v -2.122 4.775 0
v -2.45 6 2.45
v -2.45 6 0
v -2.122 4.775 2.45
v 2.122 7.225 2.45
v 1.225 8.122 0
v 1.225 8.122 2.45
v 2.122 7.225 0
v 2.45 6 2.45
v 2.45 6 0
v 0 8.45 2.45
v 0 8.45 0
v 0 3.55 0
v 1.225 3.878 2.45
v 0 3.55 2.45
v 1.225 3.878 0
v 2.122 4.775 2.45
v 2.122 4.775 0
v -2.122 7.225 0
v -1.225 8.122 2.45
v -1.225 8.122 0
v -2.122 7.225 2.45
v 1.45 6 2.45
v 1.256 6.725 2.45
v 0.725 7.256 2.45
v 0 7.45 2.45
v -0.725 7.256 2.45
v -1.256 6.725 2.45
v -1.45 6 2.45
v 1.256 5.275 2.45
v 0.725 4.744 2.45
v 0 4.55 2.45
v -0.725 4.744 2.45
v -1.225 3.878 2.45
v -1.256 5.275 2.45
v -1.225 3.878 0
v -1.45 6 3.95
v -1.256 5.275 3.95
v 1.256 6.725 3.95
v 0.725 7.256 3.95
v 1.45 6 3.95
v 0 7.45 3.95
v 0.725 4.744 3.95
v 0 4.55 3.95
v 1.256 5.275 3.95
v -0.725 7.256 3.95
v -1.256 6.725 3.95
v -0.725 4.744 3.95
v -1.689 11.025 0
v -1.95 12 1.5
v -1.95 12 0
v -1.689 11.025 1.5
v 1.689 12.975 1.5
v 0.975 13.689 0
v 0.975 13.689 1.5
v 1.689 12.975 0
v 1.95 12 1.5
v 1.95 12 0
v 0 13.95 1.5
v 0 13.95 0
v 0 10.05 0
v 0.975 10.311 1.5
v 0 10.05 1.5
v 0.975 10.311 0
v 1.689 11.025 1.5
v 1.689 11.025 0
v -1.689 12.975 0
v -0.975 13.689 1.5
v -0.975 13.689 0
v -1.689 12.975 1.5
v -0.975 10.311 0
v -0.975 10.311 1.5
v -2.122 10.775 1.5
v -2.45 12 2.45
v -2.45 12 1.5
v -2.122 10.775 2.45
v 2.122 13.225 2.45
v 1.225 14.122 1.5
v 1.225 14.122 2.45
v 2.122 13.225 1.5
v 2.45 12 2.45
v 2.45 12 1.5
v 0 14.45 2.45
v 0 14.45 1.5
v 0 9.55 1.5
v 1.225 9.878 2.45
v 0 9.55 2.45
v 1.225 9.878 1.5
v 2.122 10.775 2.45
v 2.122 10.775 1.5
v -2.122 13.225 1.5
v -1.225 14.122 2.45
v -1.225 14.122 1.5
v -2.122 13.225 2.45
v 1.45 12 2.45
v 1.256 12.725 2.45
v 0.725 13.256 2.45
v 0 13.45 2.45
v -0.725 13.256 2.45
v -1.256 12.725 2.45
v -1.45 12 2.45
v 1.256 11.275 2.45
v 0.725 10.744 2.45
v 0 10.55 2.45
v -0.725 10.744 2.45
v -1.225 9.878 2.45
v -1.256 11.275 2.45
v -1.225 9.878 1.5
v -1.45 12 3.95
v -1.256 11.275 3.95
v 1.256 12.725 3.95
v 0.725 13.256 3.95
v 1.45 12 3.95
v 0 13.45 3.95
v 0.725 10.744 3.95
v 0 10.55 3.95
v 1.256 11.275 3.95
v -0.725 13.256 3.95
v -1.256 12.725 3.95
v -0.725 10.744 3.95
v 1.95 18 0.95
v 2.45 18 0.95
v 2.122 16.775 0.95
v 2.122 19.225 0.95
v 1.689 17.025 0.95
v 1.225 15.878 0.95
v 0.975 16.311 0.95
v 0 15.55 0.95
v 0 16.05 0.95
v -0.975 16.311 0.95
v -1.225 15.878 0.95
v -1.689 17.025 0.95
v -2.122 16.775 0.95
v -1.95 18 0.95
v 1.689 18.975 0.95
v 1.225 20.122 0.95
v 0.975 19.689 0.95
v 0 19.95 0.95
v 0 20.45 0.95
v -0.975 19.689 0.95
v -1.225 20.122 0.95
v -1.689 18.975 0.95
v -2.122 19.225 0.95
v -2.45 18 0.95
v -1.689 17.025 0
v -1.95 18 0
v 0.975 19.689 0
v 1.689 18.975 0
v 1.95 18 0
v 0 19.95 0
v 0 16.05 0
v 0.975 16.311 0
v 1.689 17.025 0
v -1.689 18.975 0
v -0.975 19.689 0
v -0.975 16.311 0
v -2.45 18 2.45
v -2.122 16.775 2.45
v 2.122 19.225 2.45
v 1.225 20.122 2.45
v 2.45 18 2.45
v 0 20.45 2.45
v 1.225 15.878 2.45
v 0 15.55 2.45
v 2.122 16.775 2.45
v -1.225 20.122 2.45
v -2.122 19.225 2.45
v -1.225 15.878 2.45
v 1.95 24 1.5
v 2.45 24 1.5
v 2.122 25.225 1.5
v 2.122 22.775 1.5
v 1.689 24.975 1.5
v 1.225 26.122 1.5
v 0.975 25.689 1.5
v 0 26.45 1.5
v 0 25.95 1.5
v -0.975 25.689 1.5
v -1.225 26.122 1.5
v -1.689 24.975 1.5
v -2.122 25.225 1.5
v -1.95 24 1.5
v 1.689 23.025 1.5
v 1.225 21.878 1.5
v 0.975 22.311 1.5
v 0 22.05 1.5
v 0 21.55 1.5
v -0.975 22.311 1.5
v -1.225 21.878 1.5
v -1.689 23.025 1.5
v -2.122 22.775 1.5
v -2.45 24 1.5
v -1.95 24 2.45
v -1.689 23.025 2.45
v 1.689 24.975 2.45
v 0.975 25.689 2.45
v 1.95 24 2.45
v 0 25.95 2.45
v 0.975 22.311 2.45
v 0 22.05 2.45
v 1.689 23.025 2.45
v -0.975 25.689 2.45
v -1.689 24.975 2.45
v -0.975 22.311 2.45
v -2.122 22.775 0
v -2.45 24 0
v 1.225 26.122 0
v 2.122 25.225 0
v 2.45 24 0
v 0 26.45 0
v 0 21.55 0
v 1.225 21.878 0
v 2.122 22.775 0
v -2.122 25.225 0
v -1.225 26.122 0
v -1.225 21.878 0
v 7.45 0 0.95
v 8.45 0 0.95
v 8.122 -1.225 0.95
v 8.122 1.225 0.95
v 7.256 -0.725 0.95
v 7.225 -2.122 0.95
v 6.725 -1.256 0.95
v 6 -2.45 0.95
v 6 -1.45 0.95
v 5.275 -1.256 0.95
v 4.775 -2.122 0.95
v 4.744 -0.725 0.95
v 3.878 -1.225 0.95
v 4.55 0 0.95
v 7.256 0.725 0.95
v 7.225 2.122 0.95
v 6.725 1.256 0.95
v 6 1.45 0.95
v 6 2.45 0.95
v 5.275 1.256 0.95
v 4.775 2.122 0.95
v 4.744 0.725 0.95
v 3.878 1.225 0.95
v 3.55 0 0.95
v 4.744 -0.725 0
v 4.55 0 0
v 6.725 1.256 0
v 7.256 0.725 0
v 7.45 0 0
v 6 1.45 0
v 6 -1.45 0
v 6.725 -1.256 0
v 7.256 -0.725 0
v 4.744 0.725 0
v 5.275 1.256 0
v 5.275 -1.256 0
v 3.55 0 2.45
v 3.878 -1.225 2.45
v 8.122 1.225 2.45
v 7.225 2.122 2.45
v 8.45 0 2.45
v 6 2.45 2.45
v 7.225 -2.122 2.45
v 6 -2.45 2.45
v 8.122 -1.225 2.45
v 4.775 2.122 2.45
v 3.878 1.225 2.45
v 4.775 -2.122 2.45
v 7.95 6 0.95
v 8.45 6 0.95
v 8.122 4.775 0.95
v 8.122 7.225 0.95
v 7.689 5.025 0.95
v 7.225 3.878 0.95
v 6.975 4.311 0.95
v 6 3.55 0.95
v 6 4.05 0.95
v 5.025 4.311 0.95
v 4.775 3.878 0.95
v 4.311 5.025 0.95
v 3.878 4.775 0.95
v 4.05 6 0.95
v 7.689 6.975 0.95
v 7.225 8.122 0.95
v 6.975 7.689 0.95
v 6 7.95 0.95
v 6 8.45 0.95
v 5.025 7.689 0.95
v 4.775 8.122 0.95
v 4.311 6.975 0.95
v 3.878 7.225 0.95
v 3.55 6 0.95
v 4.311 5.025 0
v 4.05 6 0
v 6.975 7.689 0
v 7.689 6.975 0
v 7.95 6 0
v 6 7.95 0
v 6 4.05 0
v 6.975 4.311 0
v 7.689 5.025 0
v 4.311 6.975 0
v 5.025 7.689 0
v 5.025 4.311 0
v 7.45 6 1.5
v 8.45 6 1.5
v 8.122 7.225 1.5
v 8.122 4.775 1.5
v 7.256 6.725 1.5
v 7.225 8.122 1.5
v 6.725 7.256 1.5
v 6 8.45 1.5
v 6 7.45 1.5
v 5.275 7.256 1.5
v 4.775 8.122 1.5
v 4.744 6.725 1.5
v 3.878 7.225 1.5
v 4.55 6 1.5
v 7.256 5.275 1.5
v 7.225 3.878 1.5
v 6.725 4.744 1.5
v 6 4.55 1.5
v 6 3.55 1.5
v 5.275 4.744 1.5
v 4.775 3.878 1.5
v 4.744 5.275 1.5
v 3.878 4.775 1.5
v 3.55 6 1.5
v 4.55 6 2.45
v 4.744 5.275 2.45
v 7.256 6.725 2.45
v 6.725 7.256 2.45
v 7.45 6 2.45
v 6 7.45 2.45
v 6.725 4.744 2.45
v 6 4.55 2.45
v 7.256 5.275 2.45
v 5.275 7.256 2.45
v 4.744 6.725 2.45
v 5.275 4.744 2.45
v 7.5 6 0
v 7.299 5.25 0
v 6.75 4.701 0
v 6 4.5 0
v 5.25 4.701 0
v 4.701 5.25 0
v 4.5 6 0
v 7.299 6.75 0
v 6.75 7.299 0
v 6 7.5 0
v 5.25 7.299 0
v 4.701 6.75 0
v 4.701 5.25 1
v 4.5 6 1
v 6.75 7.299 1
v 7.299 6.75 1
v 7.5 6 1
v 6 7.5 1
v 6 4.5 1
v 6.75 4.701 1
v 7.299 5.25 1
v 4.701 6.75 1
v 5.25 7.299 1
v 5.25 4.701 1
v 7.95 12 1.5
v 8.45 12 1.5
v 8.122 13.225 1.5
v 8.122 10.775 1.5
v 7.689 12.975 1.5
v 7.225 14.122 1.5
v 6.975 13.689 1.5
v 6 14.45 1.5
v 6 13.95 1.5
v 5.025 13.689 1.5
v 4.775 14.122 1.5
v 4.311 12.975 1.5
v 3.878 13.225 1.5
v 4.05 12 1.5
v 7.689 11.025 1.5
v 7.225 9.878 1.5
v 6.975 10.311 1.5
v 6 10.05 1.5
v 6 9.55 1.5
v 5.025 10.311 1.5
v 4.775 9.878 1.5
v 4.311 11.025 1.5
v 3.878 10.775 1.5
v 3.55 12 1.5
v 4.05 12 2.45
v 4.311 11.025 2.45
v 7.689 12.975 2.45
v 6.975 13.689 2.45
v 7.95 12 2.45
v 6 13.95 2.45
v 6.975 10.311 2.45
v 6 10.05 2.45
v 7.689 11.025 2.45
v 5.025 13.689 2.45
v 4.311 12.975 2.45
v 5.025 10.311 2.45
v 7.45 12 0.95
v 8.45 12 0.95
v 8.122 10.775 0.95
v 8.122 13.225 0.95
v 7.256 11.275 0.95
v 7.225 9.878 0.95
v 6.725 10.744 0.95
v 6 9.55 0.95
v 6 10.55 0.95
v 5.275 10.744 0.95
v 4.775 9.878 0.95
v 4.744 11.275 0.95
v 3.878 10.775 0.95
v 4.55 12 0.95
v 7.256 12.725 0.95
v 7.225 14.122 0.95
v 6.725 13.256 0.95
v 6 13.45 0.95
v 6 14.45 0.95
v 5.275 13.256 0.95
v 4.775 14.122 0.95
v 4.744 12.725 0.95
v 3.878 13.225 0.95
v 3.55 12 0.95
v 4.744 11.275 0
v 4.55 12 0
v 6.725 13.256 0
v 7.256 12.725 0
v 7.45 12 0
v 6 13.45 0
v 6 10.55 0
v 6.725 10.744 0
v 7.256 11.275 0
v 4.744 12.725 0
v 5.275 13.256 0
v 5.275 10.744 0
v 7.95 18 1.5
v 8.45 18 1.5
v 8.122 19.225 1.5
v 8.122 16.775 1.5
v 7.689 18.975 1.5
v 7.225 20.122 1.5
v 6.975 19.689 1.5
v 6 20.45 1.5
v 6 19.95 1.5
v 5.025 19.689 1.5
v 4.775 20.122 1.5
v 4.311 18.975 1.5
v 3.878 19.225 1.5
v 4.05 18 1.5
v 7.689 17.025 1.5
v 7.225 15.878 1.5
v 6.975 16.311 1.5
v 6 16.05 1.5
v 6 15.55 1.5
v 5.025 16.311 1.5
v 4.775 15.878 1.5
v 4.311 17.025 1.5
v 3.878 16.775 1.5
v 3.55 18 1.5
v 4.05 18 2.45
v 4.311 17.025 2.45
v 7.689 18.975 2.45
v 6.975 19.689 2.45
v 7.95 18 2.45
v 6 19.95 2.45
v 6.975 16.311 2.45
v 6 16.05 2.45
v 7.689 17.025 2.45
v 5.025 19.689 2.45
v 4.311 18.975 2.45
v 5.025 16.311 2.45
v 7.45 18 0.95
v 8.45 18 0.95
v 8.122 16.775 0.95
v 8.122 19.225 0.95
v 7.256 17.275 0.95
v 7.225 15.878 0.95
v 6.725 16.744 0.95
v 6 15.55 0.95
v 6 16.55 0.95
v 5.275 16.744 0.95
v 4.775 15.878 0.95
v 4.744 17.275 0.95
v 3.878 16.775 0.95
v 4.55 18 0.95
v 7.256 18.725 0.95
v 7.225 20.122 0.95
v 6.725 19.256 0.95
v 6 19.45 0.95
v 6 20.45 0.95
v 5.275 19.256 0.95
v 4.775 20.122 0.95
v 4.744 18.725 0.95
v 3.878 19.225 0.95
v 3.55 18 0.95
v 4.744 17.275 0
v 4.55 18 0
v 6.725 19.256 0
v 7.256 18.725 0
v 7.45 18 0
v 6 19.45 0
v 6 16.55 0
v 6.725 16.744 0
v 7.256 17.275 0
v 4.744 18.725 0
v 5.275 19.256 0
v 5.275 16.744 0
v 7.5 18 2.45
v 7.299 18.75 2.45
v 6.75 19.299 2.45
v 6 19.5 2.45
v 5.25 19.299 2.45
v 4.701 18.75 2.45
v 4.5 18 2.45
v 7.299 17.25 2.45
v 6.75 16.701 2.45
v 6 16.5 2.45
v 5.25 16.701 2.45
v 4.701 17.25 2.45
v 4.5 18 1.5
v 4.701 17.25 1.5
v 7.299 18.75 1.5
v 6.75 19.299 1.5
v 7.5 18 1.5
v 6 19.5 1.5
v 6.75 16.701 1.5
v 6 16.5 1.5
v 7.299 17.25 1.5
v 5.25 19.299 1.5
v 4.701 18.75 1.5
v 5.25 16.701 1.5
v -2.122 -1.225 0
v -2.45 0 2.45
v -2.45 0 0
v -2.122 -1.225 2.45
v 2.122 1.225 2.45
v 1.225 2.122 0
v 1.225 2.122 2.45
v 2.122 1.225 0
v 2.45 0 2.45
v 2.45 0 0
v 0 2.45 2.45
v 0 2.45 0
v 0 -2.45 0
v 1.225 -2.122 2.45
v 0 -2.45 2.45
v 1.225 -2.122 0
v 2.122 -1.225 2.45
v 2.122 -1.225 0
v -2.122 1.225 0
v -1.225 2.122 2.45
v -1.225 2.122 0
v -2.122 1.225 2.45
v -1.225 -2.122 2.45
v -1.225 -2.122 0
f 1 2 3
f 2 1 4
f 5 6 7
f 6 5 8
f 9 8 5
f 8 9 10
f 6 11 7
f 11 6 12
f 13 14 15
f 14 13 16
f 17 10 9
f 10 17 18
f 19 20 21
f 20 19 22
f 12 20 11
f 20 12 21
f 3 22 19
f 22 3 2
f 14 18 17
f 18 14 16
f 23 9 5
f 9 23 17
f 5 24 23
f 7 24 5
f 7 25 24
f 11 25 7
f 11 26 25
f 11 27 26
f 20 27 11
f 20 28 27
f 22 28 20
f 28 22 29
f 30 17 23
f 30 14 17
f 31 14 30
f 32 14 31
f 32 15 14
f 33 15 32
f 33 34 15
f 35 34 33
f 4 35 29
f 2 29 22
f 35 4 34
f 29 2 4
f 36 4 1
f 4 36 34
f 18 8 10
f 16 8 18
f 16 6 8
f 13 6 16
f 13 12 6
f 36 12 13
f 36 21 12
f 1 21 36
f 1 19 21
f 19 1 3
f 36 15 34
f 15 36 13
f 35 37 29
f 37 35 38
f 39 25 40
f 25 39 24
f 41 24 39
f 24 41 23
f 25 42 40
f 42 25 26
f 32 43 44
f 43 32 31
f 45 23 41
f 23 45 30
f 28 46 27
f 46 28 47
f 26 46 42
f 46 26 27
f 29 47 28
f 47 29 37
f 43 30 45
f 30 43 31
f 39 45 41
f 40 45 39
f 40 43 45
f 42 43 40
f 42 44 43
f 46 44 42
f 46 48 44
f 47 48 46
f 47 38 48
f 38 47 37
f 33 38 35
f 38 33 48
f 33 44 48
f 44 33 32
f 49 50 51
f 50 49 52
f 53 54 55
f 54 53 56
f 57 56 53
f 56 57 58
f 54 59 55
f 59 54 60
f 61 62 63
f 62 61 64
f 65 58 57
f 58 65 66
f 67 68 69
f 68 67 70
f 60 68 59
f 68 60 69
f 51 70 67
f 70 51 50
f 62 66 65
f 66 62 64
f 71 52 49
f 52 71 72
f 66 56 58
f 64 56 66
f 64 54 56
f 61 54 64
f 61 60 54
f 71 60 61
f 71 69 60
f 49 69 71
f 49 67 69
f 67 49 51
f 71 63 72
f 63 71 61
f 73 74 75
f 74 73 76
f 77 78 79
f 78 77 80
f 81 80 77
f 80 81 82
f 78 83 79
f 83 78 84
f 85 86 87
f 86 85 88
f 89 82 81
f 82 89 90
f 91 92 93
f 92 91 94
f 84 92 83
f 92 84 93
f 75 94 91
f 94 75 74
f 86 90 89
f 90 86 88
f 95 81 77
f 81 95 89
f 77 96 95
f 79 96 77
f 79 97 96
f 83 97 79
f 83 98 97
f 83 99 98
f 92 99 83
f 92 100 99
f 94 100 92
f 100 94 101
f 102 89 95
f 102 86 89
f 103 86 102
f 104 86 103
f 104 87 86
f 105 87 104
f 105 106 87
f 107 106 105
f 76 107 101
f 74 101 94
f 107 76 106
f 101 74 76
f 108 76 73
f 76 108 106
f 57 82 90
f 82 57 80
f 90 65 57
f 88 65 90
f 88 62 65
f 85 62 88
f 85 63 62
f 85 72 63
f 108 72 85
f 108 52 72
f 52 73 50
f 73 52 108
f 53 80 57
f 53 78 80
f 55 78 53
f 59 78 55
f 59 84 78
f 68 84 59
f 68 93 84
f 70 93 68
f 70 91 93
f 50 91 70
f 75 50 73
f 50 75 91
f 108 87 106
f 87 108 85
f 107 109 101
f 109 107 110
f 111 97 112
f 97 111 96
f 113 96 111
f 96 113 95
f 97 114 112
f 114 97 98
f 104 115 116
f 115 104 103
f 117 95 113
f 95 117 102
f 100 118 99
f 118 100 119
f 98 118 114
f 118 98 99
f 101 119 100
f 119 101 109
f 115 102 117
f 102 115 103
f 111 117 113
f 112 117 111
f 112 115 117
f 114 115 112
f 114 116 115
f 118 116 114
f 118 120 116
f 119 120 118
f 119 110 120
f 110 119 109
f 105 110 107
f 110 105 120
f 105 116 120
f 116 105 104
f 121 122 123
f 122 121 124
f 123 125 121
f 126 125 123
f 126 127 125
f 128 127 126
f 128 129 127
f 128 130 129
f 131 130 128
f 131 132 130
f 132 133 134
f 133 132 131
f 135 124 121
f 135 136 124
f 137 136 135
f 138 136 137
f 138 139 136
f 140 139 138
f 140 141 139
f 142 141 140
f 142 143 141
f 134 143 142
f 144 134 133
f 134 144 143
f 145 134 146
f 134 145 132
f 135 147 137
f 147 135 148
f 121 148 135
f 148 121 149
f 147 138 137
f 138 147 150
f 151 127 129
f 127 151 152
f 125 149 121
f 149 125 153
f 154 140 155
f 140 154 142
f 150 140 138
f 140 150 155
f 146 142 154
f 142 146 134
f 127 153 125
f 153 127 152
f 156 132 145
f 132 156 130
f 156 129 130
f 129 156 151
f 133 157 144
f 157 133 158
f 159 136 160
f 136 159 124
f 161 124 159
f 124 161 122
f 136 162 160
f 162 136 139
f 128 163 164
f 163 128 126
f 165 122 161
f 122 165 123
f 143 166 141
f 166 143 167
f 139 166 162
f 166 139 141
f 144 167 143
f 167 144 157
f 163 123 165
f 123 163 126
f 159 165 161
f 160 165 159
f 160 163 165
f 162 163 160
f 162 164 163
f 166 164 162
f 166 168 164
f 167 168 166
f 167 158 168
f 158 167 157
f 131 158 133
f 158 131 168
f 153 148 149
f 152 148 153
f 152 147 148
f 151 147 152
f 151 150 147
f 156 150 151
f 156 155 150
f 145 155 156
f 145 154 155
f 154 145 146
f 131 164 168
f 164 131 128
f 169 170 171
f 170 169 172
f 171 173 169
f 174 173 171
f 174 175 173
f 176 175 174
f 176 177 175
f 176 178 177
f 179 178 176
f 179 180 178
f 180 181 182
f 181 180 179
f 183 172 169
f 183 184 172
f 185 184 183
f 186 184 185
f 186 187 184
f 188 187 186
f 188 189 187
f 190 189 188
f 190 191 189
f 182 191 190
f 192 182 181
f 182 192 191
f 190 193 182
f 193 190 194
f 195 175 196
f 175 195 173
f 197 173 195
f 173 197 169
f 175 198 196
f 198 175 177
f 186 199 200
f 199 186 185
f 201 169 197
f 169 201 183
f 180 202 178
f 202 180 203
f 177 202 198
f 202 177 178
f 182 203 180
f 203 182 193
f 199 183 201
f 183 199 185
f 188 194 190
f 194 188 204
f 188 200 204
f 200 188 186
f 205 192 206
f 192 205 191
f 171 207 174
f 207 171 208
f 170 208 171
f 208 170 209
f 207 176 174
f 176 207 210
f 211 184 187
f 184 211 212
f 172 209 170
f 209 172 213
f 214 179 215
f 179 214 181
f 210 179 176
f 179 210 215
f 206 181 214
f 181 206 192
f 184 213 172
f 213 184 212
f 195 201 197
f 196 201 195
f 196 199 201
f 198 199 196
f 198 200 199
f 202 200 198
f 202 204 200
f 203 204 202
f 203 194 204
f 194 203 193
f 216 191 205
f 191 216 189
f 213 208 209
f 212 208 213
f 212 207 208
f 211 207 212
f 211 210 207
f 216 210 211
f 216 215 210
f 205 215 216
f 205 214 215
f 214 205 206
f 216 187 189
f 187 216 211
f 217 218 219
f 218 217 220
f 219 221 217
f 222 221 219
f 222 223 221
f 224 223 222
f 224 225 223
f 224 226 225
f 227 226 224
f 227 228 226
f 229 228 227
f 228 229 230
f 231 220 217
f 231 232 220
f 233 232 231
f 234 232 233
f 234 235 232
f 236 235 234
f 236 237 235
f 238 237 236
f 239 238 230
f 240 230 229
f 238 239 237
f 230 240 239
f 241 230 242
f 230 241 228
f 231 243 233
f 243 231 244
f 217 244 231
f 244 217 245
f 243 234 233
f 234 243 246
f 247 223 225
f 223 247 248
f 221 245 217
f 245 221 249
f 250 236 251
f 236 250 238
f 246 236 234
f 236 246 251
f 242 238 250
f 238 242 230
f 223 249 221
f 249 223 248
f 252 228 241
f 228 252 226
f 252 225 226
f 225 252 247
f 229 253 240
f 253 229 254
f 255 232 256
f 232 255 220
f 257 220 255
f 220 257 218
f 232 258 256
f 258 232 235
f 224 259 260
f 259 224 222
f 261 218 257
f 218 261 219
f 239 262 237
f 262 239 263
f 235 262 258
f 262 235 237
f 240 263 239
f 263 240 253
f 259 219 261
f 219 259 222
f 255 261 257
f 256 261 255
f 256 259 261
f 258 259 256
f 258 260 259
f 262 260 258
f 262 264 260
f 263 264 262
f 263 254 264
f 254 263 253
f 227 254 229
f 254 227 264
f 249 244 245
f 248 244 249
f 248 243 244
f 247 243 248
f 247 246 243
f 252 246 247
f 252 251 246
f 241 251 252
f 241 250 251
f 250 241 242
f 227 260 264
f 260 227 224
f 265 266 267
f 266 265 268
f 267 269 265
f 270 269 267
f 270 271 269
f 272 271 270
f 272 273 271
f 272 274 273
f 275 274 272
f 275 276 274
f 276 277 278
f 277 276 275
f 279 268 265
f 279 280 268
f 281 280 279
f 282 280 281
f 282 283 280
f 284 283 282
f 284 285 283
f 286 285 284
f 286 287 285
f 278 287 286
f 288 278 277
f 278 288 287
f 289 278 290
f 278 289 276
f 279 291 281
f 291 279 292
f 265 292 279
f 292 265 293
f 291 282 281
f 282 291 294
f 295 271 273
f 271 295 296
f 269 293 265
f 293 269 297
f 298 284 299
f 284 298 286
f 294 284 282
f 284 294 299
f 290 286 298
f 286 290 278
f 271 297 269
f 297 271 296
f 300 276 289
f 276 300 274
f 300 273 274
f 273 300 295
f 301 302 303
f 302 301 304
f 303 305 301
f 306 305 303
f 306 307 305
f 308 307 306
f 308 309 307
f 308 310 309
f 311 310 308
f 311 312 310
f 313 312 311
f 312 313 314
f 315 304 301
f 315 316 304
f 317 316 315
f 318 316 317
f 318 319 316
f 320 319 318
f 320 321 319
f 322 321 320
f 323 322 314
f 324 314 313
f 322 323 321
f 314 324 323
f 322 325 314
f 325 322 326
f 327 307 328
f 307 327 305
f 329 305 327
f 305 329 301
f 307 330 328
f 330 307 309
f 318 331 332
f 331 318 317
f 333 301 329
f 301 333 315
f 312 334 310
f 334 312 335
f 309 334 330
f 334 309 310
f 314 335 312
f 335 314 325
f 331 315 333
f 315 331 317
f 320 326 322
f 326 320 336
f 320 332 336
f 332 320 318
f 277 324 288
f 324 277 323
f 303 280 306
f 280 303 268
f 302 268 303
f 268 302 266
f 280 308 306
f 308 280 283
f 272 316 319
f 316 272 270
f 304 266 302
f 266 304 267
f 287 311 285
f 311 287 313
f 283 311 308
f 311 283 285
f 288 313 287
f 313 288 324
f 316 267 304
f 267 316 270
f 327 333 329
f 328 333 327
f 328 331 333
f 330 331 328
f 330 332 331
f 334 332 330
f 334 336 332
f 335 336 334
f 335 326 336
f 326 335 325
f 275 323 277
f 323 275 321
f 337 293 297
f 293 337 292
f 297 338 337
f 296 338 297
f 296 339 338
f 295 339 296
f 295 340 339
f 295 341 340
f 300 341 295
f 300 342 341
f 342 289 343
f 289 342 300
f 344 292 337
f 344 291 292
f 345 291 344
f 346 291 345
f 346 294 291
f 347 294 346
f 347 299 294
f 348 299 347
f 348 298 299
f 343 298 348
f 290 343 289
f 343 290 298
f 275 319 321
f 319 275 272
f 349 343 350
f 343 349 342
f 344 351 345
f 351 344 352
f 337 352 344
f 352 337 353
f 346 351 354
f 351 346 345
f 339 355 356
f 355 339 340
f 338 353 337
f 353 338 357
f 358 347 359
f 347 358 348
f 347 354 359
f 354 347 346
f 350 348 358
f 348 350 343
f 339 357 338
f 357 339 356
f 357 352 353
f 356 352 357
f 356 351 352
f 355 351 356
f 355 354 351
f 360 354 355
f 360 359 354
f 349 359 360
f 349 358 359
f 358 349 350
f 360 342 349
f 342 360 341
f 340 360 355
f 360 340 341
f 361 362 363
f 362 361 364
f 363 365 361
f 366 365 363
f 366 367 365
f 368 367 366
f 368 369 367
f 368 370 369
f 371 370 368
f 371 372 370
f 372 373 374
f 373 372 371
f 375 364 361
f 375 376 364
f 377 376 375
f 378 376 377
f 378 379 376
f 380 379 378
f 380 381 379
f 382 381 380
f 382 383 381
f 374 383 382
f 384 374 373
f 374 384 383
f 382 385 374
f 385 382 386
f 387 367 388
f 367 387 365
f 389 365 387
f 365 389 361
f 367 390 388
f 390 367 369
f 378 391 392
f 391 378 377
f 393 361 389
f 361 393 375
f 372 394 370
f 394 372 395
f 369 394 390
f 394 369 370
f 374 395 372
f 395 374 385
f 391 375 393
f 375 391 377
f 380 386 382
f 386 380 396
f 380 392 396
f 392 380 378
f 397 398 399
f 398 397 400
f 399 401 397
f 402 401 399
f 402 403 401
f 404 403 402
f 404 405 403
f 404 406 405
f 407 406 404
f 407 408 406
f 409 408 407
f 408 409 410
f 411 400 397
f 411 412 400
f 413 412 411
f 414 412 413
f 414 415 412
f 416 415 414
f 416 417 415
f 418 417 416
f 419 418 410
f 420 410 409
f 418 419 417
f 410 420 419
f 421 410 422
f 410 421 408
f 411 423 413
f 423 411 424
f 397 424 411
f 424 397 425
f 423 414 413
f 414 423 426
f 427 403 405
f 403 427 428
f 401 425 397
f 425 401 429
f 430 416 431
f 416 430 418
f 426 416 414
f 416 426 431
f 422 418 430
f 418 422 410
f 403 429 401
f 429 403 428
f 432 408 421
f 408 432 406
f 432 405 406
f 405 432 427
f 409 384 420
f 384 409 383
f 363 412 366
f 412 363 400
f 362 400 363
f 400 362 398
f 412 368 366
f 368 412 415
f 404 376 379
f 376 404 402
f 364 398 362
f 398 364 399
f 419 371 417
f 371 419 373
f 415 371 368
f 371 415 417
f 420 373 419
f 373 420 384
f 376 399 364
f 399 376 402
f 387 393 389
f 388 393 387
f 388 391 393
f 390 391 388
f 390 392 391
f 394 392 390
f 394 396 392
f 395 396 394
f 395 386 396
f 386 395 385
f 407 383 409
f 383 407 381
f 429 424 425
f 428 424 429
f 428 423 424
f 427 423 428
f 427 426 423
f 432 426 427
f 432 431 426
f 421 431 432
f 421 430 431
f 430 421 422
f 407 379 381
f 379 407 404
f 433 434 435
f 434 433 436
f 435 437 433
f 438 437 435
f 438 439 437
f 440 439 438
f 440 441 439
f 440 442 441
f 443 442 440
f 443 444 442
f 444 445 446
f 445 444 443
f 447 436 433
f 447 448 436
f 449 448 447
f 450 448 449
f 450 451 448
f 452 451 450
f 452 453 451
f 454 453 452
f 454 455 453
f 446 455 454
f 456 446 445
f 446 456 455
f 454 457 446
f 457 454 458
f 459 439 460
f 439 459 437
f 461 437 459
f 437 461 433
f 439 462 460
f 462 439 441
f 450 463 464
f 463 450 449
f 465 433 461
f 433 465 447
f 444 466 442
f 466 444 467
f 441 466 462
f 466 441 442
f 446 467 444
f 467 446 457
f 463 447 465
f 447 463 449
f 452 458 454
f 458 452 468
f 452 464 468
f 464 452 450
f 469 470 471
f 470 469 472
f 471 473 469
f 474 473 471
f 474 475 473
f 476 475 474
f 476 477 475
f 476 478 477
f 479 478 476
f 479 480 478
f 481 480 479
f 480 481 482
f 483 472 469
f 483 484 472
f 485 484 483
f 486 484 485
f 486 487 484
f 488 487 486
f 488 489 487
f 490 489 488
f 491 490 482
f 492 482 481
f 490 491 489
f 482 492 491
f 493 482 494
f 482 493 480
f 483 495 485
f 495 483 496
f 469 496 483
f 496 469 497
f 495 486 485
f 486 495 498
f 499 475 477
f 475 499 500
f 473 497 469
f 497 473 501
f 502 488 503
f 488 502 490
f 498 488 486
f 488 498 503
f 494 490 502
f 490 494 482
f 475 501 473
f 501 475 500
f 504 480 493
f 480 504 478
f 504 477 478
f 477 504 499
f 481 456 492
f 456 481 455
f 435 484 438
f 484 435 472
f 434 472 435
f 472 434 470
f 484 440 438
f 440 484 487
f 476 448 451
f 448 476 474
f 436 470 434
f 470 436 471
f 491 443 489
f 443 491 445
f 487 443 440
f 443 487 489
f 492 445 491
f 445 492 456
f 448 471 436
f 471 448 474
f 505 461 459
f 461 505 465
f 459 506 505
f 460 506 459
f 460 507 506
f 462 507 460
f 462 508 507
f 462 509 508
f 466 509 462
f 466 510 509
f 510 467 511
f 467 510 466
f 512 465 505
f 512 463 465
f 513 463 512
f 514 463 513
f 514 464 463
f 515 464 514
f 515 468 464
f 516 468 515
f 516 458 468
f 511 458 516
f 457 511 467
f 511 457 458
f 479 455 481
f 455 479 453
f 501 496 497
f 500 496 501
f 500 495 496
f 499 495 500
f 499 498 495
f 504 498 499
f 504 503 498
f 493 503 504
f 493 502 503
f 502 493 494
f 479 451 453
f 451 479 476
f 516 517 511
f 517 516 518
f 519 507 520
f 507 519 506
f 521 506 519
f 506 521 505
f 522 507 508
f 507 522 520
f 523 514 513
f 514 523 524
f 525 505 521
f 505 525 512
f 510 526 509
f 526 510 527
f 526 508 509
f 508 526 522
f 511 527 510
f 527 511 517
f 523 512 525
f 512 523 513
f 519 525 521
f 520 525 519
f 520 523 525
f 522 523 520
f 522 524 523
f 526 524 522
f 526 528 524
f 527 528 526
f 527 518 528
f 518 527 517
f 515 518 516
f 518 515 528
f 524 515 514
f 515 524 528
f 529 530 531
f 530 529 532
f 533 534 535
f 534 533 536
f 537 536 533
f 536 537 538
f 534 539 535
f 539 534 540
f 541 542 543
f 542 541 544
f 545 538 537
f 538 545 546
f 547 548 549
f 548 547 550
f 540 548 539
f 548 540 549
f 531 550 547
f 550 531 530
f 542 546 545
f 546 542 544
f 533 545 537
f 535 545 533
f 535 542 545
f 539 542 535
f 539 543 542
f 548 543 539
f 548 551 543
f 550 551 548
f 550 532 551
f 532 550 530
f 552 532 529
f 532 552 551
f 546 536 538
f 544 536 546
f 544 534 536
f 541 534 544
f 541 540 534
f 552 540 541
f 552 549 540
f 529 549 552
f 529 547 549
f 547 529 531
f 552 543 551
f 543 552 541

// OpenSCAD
// file: parts/rounds/basic_round.scad
// basic round
module basic_round_variation() {
  echo("######################################");
  echo("basic round - variations :");
  echo("* 'mark_I'     (0)   : basic one, just round");
  echo("* 'mark_II'    (1)   : like a round with a stud");
  echo("* 'mark_III'   (2)   : mini stud on top, big stud on bottom REWORK");
  echo("* 'mark_IV'    (3)   : just the big stud, on bottom REWORK");
  echo("* 'mark_V'     (4)   : big stud but on top REWORK");
  echo("* 'mark_VI'    (5)   : small stud on bottom REWORK");
  echo("* 'mark_VII'   (6)   : the 'mark_III' with a hole in the big stud REWORK");
  echo("* 'mark_VIII'  (7)   : invert of 'mark_III' REWORK");
  echo("* 'mark_IX'    (8)   : invert of 'mark_VII' REWORK");
  echo("* 'mark_X'     (9)   : double small_stud, on each side NOT READY");
  echo("* 'mark_XI'    (10)  : like 'mark_X', but with big stud NOT READY");
  echo("* 'mark_XII'   (11)  : the 'mark_XI' with holes NOT READY");
  echo("######################################");
}

module basic_round_show() {
  translate([0,0,0]) basic_round(variation="mark_I");
  translate([0,6,0]) basic_round(variation="mark_II");
  translate([0,12,0]) basic_round(variation="mark_III");
  translate([0,18,0]) basic_round(variation="mark_IV");
  translate([0,24,0]) basic_round(variation="mark_V");
  translate([6,0,0]) basic_round(variation="mark_VI");
  translate([6,6,0]) basic_round(variation="mark_VII");
  translate([6,12,0]) basic_round(variation="mark_VIII");
  translate([6,18,0]) basic_round(variation="mark_IX");
  translate([6,24,0]) basic_round(variation="mark_X");
  translate([12,0,0]) basic_round(variation="mark_XI");
  translate([12,6,0]) basic_round(variation="mark_XII");
}

module basic_round(size=1,det=1,variation="mark_I") {
  // INTERNAL MODULES ################################
  // #################################################
  module ring(h,i,o,$fn=12) {
    difference() {
      cylinder(h,d=o,center=true);
      cylinder((h+1),d=i,center=true);
    }
  }
  // #################################################
  det = 12*size*det;
  $fn = det;
  if (variation == "mark_I" || variation == 0) {
    cylinder(h=size*2.5-0.05,d=size*5-0.1,center=false,$fn=det);
  }
  else if (variation == "mark_II" || variation == 1) {
    union() {
      cylinder(h=size*2.5-0.05,d=size*5-0.1,center=false,$fn=det);
      translate([0,0,size*2.5-0.15]) cylinder(h=size*1.5+0.1,d=size*3-0.1,center=false,$fn=det);
    }
  }
  else if (variation == "mark_III" || variation == 2) { // REWORK
    union() {
      //
      cylinder(h=size*1.5+0.1,d=size*4-0.1,center=false,$fn=det);
      //
      translate([0,0,size*1.5]) cylinder(h=size-0.05,d=size*5-0.1,center=false,$fn=det);
      //
      translate([0,0,size*2.5-0.15]) cylinder(h=size*1.5+0.1,d=size*3-0.1,center=false,$fn=det);
      //
      //
      //translate([0,0,size*2]) ring(size,size*3-0.1,size*5,$fn=det);
      //translate([0,0,size*0.5-0.1]) ring(size+0.1,size*4-0.1,size*5,$fn=det);
    }
  }
  else if (variation == "mark_IV" || variation == 3) { // REWORK
    difference() {
      cylinder(h=size*2.5-0.05,d=size*5-0.1,center=false,$fn=det);
      translate([0,0,size*0.5-0.1]) ring(size+0.1,size*4-0.1,size*5,$fn=det);
    }
  }
  else if (variation == "mark_V" || variation == 4) { // REWORK
    difference() {
      cylinder(h=size*2.5-0.05,d=size*5-0.1,center=false,$fn=det);
      translate([0,0,size*2]) ring(size,size*4-0.1,size*5,$fn=det);
    }
  }
  else if (variation == "mark_VI" || variation == 5) { // REWORK
    difference() {
      cylinder(h=size*2.5-0.05,d=size*5-0.1,center=false,$fn=det);
      translate([0,0,size*0.5-0.1]) ring(size+0.1,size*3-0.1,size*5,$fn=det);
    }
  }
  else if (variation == "mark_VII" || variation == 6) { // REWORK
    difference() {
      cylinder(h=size*2.5-0.05,d=size*5-0.1,center=false,$fn=det);
      translate([0,0,size*2]) ring(size,size*3-0.1,size*5,$fn=det);
      translate([0,0,size*0.5-0.1]) ring(size+0.1,size*4-0.1,size*5,$fn=det);
      translate([0,0,-0.1]) cylinder(h=size+0.1,d=size*3,center=false,$fn=det);
    }
  }
  else if (variation == "mark_VIII" || variation == 7) { // REWORK
    difference() {
      cylinder(h=size*2.5-0.05,d=size*5-0.1,center=false,$fn=det);
      translate([0,0,size*2]) ring(size,size*4-0.1,size*5,$fn=det);
      translate([0,0,size*0.5-0.1]) ring(size+0.1,size*3-0.1,size*5,$fn=det);
    }
  }
  else if (variation == "mark_IX" || variation == 8) { // REWORK
    difference() {
      cylinder(h=size*2.5-0.05,d=size*5-0.1,center=false,$fn=det);
      translate([0,0,size*2]) ring(size,size*4-0.1,size*5,$fn=det);
      translate([0,0,size*2]) cylinder(h=size,d=size*3,center=true,$fn=det);
      translate([0,0,size*0.5-0.1]) ring(size+0.1,size*3-0.1,size*5,$fn=det);
    }
  }
}
// file: parts/angulars/basic_plate.scad
// basic plate

// IDEAS ####
// with or without angles
// limit size for some angles
// 
// ##########

module basic_plate_variation() {
  echo("######################################");
  echo("basic plate - variations :");
  echo("* 'mark_I'     (0)   : the most basic, choose the dim NOT READY");
  echo("* 'mark_II'    (1)   : with a hole in, for big stud NOT READY");
  echo("* 'mark_III'   (2)   : with a groove on bottom NOT READY");
  echo("* 'mark_IV'    (3)   : with a groove on top NOT READY");
  echo("* 'mark_V'     (4)   : 'mark_II' + 'mark_III' NOT READY");
  echo("* 'mark_VI'    (5)   : 'mark_II' + 'mark_IV' NOT READY");
  echo("######################################");
}

module basic_plate_show() {
  translate([0,0,0]) basic_plate(variation="mark_I");
  //
  //
}

module basic_plate(h=1,l=1,d=1,det=1,variation="mark_I") {
  // INTERNAL MODULES ################################
  // #################################################
  // #################################################
  det = 12*size*det;
  $fn=det;
  if (variation == "mark_I" || variation == 0) {
    //
    //translate([0,0,size*1.25]) cube();
    //
  }
}
// file: parts/rounds/basic_disc.scad
//basic disc
module basic_disc_variation() {
  //
  //
}

module basic_disc_show() {
  //
  //
}

module basic_disc(size=1,det=1,variation="mark_I") {
  //
  //
}
// main file
//CONCEPTION FILE

//
// INFO : support de tête -> size*3 de rayon, soit minimum 3
// INFO : flag -> size 1
// INFO : plate -> size 2.5
// INFO : base -> size 5
// INFO : cube -> size 10
// INFO : stud -> size 3, h size 1
// INFO : big stud -> size 4, h size 1
//
// INFO : V -> variation
// INFO : S -> show
// INFO : I -> includes
//

//include <monsters/basic_monster.scad>
//basic_monster_variation();

/*
include <parts/rounds/basic_disc.scad>
basic_disc_variation();
basic_disc_show();
*/

/*
include <parts/angulars/basic_plate.scad>
basic_plate_variation();
basic_plate_show();
*/

include <parts/rounds/basic_round.scad>
basic_round_variation();
basic_round_show();

// #################################################
// ###                   IDEAS                   ###
// #################################################

// écrou de verrou
// barrique
// plaque
// moteur
// plantes
// pièces de base

// #################################################
// ###                    TODO                   ###
// #################################################

// parts/heads/box_head.scad

// #################################################
// ###                    DOING                  ###
// #################################################

// libs/lib_001.scad
// VI monsters/basic_monster.scad
// VS parts/angulars/basic_plate.scad
// VS parts/rounds/basic_disc.scad

// #################################################
// ###                    DONE                   ###
// #################################################

// parts/heads/can_head.scad
// parts/links/T_link.scad
// parts/small_pieces/tray.scad
// VS parts/rounds/basic_round.scad
